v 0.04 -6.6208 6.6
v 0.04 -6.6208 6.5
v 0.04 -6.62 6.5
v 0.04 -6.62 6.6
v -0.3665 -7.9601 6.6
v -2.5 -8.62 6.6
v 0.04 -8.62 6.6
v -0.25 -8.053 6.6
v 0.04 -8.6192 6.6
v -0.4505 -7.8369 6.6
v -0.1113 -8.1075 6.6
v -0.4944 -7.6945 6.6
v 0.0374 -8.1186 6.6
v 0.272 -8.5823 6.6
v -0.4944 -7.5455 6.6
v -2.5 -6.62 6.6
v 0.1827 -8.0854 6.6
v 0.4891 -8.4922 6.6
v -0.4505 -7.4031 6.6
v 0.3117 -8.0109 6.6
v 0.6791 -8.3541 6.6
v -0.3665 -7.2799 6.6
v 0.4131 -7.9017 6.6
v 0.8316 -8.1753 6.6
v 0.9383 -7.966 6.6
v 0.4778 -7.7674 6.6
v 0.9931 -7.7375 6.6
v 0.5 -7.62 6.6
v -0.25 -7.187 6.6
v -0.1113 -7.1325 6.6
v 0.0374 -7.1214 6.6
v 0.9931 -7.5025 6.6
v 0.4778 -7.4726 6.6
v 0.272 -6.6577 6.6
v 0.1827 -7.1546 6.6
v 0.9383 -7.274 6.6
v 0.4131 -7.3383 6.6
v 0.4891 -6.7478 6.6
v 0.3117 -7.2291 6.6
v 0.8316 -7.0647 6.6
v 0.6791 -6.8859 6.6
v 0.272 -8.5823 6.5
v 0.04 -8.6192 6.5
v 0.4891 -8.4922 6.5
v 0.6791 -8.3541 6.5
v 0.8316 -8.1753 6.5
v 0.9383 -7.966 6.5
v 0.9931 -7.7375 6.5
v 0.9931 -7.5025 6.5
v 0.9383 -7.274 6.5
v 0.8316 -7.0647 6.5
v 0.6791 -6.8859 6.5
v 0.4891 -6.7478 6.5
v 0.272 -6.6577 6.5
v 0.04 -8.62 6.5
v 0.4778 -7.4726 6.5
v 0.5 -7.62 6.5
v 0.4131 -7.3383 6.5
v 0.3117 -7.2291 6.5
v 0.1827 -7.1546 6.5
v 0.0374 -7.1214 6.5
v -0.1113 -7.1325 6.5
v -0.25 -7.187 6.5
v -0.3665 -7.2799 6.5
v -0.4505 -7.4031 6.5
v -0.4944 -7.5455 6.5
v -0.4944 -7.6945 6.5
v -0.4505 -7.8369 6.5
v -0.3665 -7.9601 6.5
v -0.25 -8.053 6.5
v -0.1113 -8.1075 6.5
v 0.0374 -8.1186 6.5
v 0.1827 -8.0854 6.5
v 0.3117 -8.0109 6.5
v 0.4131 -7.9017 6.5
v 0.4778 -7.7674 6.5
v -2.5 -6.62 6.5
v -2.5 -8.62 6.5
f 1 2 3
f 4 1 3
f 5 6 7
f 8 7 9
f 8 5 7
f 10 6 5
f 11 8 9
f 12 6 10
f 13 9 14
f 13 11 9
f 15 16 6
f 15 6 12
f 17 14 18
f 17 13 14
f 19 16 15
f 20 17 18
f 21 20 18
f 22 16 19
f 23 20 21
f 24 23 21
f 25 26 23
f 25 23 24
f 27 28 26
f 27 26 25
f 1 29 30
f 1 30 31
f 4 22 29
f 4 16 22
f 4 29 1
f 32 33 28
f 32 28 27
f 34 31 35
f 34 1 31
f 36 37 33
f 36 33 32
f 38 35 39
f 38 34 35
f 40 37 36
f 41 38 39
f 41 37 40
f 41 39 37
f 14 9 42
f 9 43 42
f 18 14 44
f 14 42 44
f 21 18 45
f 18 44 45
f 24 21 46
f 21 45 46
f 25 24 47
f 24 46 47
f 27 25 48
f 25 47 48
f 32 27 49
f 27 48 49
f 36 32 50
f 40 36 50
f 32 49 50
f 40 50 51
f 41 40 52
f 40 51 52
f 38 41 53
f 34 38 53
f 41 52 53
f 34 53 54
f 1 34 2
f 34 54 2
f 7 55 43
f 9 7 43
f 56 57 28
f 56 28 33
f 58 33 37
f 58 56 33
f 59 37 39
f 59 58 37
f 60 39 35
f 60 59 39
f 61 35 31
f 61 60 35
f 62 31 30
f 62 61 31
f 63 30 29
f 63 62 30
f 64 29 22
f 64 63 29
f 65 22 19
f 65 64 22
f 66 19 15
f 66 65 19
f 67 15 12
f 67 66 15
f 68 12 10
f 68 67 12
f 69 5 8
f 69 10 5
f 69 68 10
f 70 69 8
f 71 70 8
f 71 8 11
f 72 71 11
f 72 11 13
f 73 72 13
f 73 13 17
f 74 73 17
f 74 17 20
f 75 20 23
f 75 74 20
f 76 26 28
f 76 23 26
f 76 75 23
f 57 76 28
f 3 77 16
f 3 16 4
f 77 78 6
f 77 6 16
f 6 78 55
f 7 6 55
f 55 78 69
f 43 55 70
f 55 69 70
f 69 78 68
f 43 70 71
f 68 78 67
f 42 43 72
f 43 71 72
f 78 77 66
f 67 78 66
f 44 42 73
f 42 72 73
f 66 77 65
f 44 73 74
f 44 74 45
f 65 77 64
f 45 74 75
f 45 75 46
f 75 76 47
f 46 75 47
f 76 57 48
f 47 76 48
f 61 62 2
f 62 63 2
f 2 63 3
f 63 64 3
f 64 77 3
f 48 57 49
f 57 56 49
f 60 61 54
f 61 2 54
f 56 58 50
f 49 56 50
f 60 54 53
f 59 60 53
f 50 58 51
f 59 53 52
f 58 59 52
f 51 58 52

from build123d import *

# Parameters (mm, degrees)
CYLINDER011_R     = 0.5
CYLINDER011_DEPTH = 0.1
BOX006_W          = 2.54
BOX006_H          = 2
BOX006_DEPTH      = 0.1
CYLINDER010_R     = 0.5
CYLINDER010_DEPTH = 0.1
CYLINDER009_R     = 1
CYLINDER009_DEPTH = 0.1


with BuildPart() as cylinder011:
    # Cylinder011 → Cylinder011 (new body)
    with BuildSketch(Plane.XY.offset(1)):
        Circle(CYLINDER011_R)
    extrude(amount=CYLINDER011_DEPTH)


with BuildPart() as cut008:
    # Box006 → Box006 (new body)
    with BuildSketch(Plane(origin=(-2.5, -1, 1), x_dir=(1, 0, 0), z_dir=(0, 0, 1))):
        with Locations((1.27, 1)):
            Rectangle(BOX006_W, BOX006_H)
    extrude(amount=BOX006_DEPTH)

    # Cut008: cut Cylinder011
    add(cylinder011.part, mode=Mode.SUBTRACT)


with BuildPart() as cylinder010:
    # Cylinder010 → Cylinder010 (new body)
    with BuildSketch(Plane.XY.offset(1)):
        Circle(CYLINDER010_R)
    extrude(amount=CYLINDER010_DEPTH)


with BuildPart() as fusion003:
    # Cylinder009 → Cylinder009 (new body)
    with BuildSketch(Plane.XY.offset(1)):
        Circle(CYLINDER009_R)
    extrude(amount=CYLINDER009_DEPTH)

    # Cut007: cut Cylinder010
    add(cylinder010.part, mode=Mode.SUBTRACT)

    # Fusion003: union Cut008
    add(cut008.part)


with BuildPart() as fusion003_1:
    # Fusion003 placement: moved
    add(fusion003.part.moved(Location((0, -7.62, 5.5))))


solid = fusion003_1.part
